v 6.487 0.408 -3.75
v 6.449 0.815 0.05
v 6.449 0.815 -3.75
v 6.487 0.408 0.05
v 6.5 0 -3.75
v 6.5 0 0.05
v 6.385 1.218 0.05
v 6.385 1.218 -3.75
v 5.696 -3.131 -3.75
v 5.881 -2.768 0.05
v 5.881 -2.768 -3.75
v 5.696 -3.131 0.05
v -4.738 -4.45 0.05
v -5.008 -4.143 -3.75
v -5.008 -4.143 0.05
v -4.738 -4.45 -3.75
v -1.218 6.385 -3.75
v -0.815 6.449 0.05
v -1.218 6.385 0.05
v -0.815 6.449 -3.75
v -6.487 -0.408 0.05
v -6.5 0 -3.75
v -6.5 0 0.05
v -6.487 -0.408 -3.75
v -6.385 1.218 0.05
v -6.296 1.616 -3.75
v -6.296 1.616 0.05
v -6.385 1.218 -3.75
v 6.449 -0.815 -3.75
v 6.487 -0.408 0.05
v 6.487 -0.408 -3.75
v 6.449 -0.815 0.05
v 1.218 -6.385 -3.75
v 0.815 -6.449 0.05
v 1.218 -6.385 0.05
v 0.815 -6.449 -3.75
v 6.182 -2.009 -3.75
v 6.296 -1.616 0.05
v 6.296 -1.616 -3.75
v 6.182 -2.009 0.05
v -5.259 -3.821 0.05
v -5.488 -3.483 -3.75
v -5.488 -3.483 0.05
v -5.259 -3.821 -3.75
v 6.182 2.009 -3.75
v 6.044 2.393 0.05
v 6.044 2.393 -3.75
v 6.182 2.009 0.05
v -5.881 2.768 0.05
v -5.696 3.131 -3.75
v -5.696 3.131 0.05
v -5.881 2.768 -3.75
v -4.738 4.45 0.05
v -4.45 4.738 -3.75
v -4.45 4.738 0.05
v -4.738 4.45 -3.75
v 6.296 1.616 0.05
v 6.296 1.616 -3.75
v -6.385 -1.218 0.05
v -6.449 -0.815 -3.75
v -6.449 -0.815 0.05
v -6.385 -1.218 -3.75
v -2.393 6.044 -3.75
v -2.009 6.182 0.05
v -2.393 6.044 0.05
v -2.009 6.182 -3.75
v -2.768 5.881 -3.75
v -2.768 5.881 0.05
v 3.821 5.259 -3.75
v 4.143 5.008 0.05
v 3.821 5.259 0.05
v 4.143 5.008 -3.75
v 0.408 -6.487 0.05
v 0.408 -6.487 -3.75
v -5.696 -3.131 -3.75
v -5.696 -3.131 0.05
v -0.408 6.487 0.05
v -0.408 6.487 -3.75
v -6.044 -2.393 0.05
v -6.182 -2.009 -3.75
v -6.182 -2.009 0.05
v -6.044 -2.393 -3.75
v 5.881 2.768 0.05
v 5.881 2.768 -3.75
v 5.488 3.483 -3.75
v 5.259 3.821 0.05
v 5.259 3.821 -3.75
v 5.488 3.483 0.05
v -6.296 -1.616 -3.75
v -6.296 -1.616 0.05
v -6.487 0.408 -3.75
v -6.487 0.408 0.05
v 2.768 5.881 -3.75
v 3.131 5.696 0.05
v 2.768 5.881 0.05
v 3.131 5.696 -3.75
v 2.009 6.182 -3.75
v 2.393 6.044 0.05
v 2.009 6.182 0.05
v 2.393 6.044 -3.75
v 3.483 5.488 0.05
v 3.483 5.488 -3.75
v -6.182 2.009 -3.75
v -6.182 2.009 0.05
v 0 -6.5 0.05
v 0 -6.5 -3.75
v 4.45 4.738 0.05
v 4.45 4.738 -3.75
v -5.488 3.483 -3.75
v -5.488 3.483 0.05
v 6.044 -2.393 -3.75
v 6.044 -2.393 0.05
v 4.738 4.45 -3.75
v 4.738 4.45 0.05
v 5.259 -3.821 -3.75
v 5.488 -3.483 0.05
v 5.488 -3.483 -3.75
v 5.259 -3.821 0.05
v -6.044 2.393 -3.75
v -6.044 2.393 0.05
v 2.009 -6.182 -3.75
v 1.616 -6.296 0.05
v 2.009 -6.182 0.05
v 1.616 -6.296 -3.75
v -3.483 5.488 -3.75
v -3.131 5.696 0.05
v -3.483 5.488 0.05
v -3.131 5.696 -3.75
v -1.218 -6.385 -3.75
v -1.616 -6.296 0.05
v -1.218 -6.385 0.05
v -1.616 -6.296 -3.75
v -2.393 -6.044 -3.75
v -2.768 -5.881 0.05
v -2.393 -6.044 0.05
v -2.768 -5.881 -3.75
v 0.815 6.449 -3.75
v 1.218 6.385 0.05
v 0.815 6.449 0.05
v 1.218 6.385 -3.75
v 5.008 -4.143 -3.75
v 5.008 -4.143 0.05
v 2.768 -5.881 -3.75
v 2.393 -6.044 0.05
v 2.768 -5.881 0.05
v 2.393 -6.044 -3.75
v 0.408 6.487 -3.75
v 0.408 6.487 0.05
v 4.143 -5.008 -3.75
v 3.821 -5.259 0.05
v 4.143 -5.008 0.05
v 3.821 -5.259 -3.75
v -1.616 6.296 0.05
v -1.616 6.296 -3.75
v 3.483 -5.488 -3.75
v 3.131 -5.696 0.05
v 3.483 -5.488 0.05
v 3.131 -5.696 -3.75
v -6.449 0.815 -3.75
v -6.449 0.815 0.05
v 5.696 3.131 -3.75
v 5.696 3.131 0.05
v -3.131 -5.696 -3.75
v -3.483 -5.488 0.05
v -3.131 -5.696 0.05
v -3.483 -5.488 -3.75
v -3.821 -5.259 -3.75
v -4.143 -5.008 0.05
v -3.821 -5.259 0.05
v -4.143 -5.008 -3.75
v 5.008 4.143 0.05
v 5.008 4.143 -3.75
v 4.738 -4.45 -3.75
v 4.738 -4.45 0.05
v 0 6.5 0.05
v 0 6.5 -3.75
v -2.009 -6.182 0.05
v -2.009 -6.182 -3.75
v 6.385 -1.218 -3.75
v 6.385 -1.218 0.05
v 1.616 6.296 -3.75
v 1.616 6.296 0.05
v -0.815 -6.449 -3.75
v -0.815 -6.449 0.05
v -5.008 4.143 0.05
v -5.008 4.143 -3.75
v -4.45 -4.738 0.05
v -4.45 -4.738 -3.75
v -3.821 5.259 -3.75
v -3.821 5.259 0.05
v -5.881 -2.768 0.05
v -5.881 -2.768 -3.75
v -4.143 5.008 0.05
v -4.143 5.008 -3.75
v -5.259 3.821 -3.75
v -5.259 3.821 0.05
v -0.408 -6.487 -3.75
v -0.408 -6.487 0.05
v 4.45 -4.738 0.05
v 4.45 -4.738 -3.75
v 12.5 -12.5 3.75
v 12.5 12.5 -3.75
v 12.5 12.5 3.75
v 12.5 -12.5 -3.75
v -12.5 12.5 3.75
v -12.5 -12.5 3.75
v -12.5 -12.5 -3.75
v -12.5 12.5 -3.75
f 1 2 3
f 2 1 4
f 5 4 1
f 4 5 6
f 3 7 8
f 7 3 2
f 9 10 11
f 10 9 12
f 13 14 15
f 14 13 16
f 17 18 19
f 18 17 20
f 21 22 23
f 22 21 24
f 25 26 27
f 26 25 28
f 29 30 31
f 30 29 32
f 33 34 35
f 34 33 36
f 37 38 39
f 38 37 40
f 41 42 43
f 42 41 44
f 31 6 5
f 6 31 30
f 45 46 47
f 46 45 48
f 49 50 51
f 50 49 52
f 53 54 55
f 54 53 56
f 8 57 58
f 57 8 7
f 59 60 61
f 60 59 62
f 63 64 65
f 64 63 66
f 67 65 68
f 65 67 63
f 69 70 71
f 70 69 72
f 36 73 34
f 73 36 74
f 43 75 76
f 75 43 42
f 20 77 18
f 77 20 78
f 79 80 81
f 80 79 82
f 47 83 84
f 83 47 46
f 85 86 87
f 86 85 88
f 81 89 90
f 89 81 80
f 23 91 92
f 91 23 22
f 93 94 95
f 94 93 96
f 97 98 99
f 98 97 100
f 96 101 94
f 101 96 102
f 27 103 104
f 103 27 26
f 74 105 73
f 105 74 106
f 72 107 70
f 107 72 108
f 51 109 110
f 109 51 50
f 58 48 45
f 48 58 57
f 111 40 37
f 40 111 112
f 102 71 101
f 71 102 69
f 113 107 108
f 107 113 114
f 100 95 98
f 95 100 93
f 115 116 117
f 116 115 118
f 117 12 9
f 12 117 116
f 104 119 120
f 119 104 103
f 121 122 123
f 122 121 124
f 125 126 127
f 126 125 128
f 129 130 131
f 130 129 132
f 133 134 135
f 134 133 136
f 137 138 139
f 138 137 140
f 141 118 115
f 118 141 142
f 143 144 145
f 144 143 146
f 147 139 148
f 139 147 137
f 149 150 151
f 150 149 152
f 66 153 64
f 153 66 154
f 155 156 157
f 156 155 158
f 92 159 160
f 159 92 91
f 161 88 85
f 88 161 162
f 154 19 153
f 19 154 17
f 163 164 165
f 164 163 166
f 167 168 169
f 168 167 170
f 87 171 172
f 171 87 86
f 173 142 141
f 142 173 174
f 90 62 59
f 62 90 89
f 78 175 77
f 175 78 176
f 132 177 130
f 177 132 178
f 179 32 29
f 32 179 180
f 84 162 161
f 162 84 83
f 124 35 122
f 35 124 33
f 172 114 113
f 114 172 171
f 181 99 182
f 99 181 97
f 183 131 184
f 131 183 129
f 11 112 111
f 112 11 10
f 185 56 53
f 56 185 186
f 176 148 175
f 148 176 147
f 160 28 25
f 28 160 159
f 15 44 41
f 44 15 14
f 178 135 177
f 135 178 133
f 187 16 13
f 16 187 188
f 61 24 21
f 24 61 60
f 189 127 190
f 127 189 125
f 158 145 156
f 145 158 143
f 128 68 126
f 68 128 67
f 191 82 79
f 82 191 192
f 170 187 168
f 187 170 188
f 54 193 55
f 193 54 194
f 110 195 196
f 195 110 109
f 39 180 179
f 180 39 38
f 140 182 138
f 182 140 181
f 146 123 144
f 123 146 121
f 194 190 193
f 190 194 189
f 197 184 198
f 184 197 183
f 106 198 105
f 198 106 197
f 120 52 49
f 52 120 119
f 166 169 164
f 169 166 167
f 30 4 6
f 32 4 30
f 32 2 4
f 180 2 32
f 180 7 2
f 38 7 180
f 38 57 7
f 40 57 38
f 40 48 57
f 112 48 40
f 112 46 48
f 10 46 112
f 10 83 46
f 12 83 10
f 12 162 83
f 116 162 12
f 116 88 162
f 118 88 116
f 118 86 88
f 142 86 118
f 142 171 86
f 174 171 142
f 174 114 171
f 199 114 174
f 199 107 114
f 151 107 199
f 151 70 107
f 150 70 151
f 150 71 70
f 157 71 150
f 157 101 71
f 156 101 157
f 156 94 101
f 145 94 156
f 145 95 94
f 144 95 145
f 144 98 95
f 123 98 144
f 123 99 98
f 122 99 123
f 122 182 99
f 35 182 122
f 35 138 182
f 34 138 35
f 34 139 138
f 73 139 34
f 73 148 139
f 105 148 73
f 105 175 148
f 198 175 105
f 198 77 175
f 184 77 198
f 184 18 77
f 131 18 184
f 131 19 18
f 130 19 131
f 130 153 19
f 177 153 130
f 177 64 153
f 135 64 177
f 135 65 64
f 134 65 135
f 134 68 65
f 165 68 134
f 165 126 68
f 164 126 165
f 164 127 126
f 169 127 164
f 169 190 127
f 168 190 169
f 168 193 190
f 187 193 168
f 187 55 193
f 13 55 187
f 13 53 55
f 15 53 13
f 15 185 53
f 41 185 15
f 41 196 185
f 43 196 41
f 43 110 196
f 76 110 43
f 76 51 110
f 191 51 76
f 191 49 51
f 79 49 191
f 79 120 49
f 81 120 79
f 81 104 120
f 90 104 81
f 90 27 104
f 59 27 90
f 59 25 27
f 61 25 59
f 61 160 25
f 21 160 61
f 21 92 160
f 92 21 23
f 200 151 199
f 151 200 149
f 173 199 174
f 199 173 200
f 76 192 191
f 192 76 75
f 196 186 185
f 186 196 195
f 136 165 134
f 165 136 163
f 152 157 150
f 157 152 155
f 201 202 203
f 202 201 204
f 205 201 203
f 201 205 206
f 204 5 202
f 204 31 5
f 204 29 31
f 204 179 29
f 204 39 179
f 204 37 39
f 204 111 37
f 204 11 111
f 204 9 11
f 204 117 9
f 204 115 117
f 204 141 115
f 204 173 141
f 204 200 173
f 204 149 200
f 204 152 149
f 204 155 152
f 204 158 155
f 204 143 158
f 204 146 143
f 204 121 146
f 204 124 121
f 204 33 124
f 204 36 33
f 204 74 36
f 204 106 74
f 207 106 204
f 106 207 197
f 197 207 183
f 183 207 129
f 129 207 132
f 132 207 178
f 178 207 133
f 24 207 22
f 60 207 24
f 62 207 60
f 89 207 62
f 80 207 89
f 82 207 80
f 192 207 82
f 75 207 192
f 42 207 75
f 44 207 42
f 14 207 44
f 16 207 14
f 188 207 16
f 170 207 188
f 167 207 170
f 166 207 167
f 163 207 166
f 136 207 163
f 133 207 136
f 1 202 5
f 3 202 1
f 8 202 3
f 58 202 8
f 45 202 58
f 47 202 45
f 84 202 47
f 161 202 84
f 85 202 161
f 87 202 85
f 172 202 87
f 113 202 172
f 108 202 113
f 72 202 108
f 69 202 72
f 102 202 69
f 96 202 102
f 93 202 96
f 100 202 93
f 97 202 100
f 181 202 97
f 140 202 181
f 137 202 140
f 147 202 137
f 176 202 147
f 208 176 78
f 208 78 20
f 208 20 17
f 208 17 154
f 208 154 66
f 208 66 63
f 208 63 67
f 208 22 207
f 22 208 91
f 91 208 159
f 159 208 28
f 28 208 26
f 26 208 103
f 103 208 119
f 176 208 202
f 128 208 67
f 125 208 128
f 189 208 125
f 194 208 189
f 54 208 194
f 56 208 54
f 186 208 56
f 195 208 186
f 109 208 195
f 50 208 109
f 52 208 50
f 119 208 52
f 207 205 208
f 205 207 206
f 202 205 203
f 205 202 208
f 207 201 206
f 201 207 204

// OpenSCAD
rotate([0,0,0]){translate([-269.55,-281.3,-312.3]){difference(){union(){translate([269.55,281.3,312.3]){rotate([0,0,0]){cube(size = [25,25,7.5],center = true);}}}union(){translate([-269.55,-281.3,0]){rotate([0,0,0]){cylinder(r = 6.5,h = 624.7,center = true, $fn = 100);}}translate([-269.55,281.3,0]){rotate([0,0,0]){cylinder(r = 6.5,h = 624.7,center = true, $fn = 100);}}translate([269.55,-281.3,0]){rotate([0,0,0]){cylinder(r = 6.5,h = 624.7,center = true, $fn = 100);}}translate([269.55,281.3,0]){rotate([0,0,0]){cylinder(r = 6.5,h = 624.7,center = true, $fn = 100);}}translate([-281.3,0,-281.3]){rotate([90,0,0]){cylinder(r = 6.5,h = 624.7,center = true, $fn = 100);}}translate([-281.3,0,281.3]){rotate([90,0,0]){cylinder(r = 6.5,h = 624.7,center = true, $fn = 100);}}translate([281.3,0,-281.3]){rotate([90,0,0]){cylinder(r = 6.5,h = 624.7,center = true, $fn = 100);}}translate([281.3,0,281.3]){rotate([90,0,0]){cylinder(r = 6.5,h = 624.7,center = true, $fn = 100);}}translate([0,-269.55,-269.55]){rotate([0,90,0]){cylinder(r = 6.5,h = 624.7,center = true, $fn = 100);}}translate([0,269.55,-269.55]){rotate([0,90,0]){cylinder(r = 6.5,h = 624.7,center = true, $fn = 100);}}translate([0,-269.55,269.55]){rotate([0,90,0]){cylinder(r = 6.5,h = 624.7,center = true, $fn = 100);}}translate([0,269.55,269.55]){rotate([0,90,0]){cylinder(r = 6.5,h = 624.7,center = true, $fn = 100);}}}}}}
